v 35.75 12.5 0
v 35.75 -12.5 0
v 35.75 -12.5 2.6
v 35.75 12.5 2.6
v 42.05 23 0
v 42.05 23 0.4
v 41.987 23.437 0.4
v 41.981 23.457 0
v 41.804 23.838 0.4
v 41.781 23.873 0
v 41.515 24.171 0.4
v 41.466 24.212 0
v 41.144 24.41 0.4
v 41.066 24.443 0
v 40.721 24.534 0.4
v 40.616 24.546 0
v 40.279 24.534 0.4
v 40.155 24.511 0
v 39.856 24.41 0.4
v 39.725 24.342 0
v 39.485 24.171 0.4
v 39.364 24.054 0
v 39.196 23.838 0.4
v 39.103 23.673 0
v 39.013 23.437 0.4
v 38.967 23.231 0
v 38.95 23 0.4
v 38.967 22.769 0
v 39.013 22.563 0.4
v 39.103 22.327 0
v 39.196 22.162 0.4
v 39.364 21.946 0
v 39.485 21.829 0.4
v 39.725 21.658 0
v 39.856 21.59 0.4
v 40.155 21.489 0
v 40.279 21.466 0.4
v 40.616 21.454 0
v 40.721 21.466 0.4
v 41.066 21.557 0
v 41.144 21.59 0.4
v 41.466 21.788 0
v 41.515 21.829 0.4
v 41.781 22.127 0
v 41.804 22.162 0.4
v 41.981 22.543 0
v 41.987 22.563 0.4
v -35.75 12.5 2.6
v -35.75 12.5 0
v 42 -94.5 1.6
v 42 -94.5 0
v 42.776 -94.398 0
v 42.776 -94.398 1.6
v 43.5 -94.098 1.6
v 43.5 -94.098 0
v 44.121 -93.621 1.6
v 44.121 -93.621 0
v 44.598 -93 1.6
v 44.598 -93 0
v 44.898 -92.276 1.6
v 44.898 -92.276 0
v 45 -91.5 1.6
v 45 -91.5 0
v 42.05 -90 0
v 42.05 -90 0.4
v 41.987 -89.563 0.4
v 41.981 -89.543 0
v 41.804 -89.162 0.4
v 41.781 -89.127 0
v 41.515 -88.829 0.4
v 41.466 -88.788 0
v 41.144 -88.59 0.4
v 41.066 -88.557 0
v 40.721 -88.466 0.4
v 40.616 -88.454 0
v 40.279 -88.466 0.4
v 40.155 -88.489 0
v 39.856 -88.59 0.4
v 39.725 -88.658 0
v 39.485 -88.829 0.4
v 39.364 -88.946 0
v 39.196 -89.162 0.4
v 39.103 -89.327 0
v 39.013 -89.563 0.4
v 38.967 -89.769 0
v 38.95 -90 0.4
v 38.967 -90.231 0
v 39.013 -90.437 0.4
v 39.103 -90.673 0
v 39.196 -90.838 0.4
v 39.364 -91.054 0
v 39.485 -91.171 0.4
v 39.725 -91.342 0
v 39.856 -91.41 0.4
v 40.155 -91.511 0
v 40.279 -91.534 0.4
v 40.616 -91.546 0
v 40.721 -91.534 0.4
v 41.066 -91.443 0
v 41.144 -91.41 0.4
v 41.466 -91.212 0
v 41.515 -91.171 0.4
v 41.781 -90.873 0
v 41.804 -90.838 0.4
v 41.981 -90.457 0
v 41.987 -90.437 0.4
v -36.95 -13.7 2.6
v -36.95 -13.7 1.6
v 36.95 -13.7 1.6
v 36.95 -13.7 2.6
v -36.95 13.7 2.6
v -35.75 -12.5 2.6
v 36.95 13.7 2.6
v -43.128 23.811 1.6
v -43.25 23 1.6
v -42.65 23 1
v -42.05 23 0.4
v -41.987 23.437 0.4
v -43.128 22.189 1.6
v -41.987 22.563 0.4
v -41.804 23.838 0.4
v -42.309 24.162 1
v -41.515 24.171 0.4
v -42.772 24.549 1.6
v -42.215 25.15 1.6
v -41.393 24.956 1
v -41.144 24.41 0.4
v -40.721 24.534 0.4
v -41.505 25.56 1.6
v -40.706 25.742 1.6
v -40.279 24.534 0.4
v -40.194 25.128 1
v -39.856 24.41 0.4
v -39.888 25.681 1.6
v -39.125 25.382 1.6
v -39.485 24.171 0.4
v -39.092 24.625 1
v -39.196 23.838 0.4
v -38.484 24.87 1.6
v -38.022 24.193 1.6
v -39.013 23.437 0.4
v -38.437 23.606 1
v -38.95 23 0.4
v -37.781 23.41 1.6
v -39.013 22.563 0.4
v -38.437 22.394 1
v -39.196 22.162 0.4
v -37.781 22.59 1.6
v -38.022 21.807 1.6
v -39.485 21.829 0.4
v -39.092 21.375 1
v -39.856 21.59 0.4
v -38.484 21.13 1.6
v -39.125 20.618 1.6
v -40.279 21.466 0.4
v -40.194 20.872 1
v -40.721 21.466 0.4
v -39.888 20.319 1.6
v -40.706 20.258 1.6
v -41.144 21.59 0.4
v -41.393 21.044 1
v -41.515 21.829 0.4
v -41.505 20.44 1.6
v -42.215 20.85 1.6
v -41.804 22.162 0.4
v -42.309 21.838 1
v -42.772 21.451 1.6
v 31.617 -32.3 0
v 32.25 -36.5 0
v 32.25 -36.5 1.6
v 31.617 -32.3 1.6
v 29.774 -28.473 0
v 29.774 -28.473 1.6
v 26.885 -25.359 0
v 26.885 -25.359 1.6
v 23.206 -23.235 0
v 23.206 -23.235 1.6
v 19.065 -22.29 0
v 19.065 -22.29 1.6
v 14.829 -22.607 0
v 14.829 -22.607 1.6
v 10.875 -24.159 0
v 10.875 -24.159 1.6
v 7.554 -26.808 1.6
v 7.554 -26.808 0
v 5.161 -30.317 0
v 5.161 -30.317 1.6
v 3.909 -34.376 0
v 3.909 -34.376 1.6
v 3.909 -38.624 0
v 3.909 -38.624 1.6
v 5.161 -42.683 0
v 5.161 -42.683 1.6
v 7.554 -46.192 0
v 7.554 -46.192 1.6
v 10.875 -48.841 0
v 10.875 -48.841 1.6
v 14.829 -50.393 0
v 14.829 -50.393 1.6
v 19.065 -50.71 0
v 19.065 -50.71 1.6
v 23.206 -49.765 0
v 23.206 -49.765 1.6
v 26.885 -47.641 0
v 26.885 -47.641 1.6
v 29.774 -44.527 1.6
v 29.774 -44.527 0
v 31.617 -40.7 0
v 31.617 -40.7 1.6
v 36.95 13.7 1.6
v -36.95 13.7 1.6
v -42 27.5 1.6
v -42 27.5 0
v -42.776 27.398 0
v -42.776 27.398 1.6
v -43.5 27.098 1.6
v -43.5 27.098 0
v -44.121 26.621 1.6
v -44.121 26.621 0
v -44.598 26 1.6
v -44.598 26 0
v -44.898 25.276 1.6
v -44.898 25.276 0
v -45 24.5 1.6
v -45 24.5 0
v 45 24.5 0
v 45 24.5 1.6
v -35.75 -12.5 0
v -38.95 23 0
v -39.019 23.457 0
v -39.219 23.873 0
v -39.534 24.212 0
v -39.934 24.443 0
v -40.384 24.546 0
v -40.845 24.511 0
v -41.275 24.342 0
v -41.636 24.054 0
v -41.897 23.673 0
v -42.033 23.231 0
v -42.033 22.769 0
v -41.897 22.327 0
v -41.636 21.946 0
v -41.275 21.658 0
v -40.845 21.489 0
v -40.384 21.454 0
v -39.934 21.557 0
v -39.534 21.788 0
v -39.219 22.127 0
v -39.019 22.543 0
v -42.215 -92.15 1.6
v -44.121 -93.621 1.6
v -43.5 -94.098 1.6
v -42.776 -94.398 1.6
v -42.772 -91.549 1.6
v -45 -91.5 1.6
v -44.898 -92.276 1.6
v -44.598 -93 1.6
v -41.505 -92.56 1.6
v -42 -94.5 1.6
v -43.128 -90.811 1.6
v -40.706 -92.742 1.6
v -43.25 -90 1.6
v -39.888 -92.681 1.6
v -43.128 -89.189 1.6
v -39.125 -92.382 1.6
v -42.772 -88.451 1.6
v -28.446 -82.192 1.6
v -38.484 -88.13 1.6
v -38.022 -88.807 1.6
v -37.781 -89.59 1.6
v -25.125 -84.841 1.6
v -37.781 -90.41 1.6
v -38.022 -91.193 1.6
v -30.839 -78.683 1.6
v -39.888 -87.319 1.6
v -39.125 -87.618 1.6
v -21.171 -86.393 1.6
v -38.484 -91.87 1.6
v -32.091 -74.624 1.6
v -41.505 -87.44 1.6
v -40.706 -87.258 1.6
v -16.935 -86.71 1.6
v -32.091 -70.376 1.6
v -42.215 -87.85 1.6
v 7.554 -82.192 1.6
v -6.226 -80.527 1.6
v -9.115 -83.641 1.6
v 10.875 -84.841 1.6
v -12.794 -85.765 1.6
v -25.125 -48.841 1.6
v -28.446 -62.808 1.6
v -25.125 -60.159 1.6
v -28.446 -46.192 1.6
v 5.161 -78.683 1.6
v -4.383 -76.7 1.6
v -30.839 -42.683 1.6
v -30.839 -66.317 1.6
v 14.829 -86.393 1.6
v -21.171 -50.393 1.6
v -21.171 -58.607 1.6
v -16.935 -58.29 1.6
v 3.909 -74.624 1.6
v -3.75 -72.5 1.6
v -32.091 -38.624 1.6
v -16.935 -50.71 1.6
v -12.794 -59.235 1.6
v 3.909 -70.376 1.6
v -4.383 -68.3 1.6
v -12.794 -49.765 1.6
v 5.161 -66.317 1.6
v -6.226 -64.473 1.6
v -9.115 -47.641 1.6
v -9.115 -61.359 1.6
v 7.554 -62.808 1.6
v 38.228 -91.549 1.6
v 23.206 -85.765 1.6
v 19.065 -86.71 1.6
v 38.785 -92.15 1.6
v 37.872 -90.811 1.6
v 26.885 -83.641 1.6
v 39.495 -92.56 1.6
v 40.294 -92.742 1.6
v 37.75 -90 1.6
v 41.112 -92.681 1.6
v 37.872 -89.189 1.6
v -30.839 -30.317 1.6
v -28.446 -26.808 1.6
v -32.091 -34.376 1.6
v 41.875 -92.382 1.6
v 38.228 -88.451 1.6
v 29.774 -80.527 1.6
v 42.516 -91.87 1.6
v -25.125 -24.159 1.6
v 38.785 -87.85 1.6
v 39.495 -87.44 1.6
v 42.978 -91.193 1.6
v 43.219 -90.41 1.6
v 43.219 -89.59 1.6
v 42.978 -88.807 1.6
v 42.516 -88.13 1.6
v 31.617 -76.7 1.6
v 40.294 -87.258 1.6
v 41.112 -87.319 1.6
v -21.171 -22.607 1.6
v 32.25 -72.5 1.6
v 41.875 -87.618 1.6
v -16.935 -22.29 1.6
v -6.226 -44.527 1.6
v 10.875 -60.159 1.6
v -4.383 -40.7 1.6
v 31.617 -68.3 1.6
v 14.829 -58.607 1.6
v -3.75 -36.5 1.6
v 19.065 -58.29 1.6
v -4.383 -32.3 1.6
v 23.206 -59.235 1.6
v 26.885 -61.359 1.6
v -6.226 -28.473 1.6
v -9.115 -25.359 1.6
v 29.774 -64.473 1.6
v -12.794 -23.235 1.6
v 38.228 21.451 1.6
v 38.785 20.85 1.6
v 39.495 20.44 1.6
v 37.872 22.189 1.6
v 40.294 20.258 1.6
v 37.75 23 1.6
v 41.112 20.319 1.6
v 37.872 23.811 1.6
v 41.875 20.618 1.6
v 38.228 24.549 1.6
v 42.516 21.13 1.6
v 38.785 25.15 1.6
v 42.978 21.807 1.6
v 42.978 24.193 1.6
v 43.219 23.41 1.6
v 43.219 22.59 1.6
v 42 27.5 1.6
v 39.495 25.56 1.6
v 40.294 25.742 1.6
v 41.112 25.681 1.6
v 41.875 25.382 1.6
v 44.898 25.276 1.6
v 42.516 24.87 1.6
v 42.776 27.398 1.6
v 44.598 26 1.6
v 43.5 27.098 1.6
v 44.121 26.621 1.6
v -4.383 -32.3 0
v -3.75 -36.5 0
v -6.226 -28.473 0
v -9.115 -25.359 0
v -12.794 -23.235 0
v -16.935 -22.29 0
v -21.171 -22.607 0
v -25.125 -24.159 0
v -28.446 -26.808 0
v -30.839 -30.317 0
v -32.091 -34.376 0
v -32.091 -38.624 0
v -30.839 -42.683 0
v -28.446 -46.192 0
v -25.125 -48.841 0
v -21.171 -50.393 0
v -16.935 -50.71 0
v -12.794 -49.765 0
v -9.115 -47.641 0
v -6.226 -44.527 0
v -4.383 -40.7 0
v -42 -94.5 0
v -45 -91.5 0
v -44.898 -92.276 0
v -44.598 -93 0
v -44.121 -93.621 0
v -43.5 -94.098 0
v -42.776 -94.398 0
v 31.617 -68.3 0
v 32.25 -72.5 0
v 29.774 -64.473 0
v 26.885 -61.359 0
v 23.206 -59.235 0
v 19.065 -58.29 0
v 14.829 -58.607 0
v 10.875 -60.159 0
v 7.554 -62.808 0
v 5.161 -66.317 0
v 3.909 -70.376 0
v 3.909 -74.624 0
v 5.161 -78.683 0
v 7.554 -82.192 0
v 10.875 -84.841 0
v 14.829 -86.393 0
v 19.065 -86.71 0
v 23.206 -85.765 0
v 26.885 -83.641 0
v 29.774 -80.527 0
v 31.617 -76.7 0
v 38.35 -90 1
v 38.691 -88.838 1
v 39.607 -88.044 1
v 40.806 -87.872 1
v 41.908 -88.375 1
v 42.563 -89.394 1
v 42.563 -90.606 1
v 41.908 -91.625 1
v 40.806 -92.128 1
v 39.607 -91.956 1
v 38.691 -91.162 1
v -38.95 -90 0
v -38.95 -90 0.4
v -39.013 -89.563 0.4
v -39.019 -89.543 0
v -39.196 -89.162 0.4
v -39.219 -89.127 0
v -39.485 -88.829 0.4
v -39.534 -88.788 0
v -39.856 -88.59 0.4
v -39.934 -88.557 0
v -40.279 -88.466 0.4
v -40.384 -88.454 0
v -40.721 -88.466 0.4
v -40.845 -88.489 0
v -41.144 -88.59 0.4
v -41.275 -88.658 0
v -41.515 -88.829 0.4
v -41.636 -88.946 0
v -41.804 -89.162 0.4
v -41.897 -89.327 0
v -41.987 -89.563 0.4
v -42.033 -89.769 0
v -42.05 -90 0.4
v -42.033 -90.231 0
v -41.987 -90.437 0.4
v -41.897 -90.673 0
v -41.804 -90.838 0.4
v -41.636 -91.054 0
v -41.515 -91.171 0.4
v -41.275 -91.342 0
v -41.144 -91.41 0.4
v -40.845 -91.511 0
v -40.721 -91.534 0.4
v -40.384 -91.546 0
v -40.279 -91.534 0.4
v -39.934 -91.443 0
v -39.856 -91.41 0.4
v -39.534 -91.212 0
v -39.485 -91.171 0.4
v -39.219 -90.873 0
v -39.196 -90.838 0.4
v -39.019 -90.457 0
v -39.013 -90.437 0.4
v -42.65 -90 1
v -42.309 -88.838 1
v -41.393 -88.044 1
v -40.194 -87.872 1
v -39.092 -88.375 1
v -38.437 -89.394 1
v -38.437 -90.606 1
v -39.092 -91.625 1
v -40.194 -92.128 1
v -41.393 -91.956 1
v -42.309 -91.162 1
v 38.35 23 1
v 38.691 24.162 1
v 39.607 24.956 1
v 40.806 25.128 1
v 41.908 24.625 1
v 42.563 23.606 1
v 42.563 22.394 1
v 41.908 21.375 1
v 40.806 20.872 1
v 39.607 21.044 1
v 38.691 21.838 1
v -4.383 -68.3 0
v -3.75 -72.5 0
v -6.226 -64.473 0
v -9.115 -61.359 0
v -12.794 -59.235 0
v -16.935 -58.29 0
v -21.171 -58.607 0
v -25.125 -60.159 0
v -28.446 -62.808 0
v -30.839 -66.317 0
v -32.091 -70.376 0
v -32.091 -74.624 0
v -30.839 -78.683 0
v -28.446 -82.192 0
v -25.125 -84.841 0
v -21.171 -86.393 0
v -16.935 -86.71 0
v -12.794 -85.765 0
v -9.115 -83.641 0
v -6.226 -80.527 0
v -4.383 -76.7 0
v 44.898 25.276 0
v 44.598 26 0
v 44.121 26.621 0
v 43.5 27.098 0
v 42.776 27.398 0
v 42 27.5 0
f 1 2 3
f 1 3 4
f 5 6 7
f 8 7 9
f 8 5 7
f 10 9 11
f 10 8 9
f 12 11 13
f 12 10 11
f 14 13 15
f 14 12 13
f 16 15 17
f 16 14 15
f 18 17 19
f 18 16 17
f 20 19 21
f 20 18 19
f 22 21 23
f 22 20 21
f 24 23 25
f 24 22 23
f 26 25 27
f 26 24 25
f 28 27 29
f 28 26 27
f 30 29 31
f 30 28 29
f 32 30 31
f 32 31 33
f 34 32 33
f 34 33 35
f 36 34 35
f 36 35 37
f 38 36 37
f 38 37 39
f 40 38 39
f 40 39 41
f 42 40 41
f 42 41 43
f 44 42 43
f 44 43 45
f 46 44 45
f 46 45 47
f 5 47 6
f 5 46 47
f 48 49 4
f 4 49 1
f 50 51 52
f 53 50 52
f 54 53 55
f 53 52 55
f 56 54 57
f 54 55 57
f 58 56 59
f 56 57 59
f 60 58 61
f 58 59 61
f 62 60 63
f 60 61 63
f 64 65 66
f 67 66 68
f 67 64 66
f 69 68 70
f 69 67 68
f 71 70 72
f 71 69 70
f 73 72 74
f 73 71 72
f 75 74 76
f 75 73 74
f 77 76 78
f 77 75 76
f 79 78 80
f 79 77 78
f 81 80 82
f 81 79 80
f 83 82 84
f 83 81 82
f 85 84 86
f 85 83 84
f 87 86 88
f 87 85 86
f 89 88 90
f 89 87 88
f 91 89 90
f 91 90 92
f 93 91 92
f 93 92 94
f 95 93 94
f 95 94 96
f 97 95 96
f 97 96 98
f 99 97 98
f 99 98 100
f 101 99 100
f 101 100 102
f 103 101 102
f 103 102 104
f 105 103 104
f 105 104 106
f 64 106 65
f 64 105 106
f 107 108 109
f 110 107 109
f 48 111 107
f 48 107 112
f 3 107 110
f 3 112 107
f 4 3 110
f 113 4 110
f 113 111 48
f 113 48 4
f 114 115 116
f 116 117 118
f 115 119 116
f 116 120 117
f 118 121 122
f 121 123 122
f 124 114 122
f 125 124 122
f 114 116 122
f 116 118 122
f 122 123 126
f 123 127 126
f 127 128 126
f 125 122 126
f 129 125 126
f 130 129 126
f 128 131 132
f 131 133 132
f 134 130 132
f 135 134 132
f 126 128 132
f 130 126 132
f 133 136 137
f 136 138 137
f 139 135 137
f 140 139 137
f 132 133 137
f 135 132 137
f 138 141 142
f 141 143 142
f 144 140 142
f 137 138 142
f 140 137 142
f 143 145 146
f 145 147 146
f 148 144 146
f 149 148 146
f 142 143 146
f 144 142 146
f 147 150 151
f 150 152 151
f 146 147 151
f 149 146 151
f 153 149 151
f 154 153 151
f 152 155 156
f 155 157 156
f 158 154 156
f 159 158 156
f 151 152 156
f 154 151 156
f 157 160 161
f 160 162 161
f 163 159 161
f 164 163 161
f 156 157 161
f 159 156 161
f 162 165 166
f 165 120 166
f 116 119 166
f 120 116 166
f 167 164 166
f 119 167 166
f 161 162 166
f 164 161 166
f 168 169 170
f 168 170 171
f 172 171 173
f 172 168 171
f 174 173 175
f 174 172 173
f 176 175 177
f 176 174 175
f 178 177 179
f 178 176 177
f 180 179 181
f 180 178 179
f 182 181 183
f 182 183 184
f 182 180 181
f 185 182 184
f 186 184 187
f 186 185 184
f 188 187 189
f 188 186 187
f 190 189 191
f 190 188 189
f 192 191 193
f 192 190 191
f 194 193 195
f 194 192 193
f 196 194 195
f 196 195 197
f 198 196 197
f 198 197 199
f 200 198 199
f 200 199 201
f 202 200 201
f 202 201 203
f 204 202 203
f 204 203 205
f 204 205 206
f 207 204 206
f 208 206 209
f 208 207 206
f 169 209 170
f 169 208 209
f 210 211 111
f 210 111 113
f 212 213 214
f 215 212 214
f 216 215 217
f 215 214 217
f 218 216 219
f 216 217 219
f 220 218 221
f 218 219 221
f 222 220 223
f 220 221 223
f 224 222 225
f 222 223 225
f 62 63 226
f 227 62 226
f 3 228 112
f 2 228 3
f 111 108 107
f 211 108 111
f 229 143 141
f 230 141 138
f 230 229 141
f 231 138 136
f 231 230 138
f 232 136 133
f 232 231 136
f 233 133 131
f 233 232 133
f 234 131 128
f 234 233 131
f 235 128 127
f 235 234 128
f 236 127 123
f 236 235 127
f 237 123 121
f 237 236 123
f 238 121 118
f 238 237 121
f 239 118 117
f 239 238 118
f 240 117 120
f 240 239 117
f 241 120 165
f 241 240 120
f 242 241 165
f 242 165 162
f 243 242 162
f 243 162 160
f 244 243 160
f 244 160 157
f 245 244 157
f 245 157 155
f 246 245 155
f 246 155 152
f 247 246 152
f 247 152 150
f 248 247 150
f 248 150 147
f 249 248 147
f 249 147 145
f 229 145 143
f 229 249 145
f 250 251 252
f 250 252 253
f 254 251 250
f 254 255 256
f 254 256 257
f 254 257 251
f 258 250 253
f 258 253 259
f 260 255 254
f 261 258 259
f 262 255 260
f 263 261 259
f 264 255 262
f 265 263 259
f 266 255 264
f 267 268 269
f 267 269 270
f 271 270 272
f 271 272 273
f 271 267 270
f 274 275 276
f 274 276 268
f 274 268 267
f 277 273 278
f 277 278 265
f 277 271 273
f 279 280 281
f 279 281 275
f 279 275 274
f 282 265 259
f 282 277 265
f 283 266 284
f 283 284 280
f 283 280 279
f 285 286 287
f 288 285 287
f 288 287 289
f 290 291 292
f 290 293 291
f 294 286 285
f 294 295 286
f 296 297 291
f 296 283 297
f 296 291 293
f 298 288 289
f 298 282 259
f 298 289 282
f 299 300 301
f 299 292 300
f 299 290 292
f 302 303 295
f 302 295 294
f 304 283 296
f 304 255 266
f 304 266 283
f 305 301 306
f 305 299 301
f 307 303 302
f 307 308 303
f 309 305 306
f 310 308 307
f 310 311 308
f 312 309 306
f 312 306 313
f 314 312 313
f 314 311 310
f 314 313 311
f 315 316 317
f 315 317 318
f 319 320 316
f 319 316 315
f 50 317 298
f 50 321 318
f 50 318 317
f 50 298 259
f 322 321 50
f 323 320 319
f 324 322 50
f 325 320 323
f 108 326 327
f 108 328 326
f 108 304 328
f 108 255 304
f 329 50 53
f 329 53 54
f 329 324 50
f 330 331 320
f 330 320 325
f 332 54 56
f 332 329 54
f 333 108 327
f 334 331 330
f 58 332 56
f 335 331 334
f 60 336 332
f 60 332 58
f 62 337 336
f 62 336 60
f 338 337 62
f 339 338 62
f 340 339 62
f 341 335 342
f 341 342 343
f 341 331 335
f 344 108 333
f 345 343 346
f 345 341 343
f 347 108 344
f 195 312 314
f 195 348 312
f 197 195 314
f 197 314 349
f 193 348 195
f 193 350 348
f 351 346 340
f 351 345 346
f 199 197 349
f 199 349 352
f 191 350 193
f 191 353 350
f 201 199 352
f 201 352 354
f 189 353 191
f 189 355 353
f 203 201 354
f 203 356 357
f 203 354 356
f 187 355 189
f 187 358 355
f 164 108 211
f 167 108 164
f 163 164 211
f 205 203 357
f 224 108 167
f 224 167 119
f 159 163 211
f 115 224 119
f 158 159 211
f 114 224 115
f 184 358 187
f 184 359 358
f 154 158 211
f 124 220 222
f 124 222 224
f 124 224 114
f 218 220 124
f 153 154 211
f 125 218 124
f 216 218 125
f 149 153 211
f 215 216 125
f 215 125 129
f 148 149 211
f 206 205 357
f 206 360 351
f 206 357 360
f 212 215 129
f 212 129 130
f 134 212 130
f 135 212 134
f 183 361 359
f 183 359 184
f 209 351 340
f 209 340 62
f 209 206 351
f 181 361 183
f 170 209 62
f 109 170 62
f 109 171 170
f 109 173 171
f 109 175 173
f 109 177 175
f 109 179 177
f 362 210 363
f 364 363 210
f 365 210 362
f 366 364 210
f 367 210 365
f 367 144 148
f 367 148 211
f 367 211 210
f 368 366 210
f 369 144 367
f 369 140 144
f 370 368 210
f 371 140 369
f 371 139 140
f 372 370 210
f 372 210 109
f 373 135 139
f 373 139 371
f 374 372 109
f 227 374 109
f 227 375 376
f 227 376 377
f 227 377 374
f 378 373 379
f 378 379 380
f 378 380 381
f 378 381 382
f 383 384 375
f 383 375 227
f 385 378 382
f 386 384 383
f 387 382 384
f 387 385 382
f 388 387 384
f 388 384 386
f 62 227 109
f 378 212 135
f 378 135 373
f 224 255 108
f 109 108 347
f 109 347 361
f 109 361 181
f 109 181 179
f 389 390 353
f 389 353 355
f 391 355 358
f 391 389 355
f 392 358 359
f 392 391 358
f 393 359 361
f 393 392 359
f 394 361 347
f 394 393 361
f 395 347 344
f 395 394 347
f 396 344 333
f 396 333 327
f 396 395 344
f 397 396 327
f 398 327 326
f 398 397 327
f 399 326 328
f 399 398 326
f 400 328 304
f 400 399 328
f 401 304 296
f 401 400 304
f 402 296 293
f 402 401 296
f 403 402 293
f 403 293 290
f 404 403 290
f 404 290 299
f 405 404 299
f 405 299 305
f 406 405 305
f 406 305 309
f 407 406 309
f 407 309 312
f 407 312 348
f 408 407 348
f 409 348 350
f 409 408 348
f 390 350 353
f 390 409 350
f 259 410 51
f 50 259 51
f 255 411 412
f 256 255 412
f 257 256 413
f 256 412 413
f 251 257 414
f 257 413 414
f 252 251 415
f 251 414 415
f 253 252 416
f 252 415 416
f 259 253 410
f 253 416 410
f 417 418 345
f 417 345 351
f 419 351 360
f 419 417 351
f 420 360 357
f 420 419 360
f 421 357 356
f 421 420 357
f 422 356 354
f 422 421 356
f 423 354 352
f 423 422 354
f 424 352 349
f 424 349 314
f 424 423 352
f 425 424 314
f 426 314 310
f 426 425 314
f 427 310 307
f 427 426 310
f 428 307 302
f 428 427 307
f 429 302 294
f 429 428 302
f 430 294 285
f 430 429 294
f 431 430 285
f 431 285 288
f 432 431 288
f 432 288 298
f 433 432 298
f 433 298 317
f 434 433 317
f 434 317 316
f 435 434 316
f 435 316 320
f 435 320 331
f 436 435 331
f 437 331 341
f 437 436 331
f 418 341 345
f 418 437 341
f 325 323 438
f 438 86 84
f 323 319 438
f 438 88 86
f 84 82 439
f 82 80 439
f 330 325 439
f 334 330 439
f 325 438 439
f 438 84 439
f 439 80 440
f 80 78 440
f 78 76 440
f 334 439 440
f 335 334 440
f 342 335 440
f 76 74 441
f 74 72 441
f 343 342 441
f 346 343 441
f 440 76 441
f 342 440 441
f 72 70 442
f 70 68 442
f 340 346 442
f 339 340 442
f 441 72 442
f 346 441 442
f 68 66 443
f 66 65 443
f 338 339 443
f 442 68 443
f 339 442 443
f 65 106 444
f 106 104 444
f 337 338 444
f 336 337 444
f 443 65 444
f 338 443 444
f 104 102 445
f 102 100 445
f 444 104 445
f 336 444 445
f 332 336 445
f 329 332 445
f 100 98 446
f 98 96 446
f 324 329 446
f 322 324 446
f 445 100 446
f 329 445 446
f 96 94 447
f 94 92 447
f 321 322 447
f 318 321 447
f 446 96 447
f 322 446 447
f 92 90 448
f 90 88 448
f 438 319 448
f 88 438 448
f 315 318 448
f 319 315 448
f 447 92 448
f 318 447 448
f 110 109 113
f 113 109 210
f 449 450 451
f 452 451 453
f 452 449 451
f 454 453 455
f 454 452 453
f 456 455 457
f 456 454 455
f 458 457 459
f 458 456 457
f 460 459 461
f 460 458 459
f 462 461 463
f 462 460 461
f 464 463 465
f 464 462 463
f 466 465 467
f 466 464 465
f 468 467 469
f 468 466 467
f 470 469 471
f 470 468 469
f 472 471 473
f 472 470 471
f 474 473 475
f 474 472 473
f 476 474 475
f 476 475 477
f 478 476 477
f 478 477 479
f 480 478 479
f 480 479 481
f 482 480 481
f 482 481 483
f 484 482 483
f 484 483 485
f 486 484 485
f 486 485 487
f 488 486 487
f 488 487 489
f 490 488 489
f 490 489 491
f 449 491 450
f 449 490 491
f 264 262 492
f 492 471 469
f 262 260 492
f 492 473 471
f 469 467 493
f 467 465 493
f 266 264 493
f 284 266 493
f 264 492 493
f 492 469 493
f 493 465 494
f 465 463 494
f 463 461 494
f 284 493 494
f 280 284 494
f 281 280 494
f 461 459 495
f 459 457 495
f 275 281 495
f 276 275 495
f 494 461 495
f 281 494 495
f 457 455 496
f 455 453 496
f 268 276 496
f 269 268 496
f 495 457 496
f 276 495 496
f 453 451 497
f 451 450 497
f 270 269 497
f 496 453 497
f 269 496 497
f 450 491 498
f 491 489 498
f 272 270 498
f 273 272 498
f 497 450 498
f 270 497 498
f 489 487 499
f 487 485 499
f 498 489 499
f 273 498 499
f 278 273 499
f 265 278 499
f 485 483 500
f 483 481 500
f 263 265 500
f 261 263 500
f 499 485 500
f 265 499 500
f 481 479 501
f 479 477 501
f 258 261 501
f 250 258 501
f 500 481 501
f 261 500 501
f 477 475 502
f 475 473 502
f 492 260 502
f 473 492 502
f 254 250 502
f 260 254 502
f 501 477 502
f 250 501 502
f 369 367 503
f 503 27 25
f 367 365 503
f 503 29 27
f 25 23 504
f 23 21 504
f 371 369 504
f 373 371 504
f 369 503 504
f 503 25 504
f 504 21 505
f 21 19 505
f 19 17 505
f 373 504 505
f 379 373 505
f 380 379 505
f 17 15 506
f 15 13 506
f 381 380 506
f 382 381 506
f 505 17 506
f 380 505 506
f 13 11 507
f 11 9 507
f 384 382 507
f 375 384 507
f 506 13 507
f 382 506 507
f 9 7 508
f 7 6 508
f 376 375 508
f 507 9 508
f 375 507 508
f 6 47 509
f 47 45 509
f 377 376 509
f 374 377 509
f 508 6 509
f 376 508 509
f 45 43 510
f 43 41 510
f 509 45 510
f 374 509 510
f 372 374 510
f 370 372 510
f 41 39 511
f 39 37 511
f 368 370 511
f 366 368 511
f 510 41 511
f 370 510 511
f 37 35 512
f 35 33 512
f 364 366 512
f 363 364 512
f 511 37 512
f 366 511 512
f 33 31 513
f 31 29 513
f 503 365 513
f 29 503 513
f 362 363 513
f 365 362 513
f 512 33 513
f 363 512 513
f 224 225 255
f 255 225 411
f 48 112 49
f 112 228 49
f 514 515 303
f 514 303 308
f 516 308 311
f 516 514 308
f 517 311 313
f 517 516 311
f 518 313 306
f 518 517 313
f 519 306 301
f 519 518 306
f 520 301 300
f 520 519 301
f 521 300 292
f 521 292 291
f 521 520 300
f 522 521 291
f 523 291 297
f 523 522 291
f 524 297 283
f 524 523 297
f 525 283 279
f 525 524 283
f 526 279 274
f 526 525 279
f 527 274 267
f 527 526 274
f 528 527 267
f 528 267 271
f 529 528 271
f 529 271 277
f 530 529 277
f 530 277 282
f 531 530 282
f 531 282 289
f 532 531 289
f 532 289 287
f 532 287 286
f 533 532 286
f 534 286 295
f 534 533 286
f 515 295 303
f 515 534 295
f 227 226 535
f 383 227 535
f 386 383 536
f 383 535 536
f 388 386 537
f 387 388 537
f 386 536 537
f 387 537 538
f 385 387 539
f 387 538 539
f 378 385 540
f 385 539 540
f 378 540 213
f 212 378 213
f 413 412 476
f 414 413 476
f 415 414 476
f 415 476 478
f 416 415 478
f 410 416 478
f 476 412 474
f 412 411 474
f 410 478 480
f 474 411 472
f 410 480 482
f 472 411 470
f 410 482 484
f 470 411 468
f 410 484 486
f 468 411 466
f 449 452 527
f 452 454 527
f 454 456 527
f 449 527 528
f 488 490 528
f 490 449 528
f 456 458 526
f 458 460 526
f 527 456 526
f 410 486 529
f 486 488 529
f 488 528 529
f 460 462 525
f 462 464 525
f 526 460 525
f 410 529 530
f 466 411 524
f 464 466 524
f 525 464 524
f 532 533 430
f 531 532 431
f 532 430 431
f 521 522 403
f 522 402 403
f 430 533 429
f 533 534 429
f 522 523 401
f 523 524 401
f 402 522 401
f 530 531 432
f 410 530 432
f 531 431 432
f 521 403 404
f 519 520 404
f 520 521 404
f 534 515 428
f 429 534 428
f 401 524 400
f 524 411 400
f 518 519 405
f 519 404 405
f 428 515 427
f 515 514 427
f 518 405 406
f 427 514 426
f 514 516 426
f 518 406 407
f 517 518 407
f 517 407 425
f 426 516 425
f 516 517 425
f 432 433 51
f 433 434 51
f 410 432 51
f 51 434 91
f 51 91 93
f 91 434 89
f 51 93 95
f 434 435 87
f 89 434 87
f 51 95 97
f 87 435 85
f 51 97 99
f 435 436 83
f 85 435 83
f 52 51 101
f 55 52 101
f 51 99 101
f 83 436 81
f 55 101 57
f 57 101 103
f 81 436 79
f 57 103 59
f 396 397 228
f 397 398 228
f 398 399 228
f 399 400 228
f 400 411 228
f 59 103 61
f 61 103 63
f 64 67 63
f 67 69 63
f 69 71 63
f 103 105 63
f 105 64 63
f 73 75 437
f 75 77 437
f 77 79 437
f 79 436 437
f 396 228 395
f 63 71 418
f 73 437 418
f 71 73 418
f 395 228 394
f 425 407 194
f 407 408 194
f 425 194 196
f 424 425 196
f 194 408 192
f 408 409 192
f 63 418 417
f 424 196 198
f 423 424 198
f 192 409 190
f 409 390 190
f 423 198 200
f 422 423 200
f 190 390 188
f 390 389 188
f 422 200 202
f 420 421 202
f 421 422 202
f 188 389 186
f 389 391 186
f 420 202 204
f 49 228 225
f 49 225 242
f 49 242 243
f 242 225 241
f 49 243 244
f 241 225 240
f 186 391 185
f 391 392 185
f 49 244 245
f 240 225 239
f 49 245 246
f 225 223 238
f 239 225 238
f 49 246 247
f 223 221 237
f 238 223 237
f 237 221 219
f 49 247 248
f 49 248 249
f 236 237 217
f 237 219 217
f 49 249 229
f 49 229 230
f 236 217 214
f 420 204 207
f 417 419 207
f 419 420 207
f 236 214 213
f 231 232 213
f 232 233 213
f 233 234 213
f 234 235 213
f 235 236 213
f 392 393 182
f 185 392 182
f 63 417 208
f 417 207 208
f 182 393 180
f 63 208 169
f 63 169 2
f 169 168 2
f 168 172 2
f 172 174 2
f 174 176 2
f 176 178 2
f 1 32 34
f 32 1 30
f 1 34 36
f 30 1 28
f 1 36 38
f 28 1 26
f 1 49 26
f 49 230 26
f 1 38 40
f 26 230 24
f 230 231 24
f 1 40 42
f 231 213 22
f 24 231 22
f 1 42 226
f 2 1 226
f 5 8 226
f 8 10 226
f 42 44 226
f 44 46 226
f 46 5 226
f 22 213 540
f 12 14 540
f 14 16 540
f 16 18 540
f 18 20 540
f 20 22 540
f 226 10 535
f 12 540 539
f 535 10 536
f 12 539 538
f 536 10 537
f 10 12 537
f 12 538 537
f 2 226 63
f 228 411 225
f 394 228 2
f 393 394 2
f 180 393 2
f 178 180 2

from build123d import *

# Parameters (mm, degrees)
F0_R           = 1.55
F0_R_2         = 14.25
F0_W           = 71.5
F0_H           = 25
F1_DEPTH       = 1.6
F2_W           = 73.9
F2_H           = 27.4
F2_W_2         = 71.5
F2_H_2         = 25
F3_DEPTH       = 1
F5_D           = 3.1
F5_CSINK_D     = 5.5
F5_CSINK_ANGLE = 90


with BuildPart() as f1:
    # F0 (on Top) → F1 (new body)
    with BuildSketch(Plane.XY):
        with BuildLine():
            Line((-42, -94.5), (42, -94.5))
            ThreePointArc((42, -94.5), (44.1213203436, -93.6213203436), (45, -91.5))
            Line((45, -91.5), (45, 24.5))
            ThreePointArc((45, 24.5), (44.1213203436, 26.6213203436), (42, 27.5))
            Line((42, 27.5), (-42, 27.5))
            ThreePointArc((-42, 27.5), (-44.1213203436, 26.6213203436), (-45, 24.5))
            Line((-45, 24.5), (-45, -91.5))
            ThreePointArc((-45, -91.5), (-44.1213203436, -93.6213203436), (-42, -94.5))
        make_face()
        with Locations((-40.5, -90)):
            Circle(F0_R, mode=Mode.SUBTRACT)
        with Locations((-18, -72.5)):
            Circle(F0_R_2, mode=Mode.SUBTRACT)
        with Locations((-18, -36.5)):
            Circle(F0_R_2, mode=Mode.SUBTRACT)
        with Locations((18, -72.5)):
            Circle(F0_R_2, mode=Mode.SUBTRACT)
        with Locations((40.5, -90)):
            Circle(F0_R, mode=Mode.SUBTRACT)
        with Locations((18, -36.5)):
            Circle(F0_R_2, mode=Mode.SUBTRACT)
        with Locations((-40.5, 23)):
            Circle(F0_R, mode=Mode.SUBTRACT)
        Rectangle(F0_W, F0_H, mode=Mode.SUBTRACT)
        with Locations((40.5, 23)):
            Circle(F0_R, mode=Mode.SUBTRACT)
    extrude(amount=F1_DEPTH)

    # F2 (on face) → F3 (join)
    with BuildSketch(Plane.XY.offset(1.6)):
        Rectangle(F2_W, F2_H)
        Rectangle(F2_W_2, F2_H_2, mode=Mode.SUBTRACT)
    extrude(amount=F3_DEPTH)

    # F5 (through all)
    with Locations(Plane.XY.offset(1.6)):
        with Locations((-40.5, 23), (40.5, 23), (-40.5, -90), (40.5, -90)):
            CounterSinkHole(F5_D / 2, F5_CSINK_D / 2, counter_sink_angle=F5_CSINK_ANGLE)


solid = f1.part
